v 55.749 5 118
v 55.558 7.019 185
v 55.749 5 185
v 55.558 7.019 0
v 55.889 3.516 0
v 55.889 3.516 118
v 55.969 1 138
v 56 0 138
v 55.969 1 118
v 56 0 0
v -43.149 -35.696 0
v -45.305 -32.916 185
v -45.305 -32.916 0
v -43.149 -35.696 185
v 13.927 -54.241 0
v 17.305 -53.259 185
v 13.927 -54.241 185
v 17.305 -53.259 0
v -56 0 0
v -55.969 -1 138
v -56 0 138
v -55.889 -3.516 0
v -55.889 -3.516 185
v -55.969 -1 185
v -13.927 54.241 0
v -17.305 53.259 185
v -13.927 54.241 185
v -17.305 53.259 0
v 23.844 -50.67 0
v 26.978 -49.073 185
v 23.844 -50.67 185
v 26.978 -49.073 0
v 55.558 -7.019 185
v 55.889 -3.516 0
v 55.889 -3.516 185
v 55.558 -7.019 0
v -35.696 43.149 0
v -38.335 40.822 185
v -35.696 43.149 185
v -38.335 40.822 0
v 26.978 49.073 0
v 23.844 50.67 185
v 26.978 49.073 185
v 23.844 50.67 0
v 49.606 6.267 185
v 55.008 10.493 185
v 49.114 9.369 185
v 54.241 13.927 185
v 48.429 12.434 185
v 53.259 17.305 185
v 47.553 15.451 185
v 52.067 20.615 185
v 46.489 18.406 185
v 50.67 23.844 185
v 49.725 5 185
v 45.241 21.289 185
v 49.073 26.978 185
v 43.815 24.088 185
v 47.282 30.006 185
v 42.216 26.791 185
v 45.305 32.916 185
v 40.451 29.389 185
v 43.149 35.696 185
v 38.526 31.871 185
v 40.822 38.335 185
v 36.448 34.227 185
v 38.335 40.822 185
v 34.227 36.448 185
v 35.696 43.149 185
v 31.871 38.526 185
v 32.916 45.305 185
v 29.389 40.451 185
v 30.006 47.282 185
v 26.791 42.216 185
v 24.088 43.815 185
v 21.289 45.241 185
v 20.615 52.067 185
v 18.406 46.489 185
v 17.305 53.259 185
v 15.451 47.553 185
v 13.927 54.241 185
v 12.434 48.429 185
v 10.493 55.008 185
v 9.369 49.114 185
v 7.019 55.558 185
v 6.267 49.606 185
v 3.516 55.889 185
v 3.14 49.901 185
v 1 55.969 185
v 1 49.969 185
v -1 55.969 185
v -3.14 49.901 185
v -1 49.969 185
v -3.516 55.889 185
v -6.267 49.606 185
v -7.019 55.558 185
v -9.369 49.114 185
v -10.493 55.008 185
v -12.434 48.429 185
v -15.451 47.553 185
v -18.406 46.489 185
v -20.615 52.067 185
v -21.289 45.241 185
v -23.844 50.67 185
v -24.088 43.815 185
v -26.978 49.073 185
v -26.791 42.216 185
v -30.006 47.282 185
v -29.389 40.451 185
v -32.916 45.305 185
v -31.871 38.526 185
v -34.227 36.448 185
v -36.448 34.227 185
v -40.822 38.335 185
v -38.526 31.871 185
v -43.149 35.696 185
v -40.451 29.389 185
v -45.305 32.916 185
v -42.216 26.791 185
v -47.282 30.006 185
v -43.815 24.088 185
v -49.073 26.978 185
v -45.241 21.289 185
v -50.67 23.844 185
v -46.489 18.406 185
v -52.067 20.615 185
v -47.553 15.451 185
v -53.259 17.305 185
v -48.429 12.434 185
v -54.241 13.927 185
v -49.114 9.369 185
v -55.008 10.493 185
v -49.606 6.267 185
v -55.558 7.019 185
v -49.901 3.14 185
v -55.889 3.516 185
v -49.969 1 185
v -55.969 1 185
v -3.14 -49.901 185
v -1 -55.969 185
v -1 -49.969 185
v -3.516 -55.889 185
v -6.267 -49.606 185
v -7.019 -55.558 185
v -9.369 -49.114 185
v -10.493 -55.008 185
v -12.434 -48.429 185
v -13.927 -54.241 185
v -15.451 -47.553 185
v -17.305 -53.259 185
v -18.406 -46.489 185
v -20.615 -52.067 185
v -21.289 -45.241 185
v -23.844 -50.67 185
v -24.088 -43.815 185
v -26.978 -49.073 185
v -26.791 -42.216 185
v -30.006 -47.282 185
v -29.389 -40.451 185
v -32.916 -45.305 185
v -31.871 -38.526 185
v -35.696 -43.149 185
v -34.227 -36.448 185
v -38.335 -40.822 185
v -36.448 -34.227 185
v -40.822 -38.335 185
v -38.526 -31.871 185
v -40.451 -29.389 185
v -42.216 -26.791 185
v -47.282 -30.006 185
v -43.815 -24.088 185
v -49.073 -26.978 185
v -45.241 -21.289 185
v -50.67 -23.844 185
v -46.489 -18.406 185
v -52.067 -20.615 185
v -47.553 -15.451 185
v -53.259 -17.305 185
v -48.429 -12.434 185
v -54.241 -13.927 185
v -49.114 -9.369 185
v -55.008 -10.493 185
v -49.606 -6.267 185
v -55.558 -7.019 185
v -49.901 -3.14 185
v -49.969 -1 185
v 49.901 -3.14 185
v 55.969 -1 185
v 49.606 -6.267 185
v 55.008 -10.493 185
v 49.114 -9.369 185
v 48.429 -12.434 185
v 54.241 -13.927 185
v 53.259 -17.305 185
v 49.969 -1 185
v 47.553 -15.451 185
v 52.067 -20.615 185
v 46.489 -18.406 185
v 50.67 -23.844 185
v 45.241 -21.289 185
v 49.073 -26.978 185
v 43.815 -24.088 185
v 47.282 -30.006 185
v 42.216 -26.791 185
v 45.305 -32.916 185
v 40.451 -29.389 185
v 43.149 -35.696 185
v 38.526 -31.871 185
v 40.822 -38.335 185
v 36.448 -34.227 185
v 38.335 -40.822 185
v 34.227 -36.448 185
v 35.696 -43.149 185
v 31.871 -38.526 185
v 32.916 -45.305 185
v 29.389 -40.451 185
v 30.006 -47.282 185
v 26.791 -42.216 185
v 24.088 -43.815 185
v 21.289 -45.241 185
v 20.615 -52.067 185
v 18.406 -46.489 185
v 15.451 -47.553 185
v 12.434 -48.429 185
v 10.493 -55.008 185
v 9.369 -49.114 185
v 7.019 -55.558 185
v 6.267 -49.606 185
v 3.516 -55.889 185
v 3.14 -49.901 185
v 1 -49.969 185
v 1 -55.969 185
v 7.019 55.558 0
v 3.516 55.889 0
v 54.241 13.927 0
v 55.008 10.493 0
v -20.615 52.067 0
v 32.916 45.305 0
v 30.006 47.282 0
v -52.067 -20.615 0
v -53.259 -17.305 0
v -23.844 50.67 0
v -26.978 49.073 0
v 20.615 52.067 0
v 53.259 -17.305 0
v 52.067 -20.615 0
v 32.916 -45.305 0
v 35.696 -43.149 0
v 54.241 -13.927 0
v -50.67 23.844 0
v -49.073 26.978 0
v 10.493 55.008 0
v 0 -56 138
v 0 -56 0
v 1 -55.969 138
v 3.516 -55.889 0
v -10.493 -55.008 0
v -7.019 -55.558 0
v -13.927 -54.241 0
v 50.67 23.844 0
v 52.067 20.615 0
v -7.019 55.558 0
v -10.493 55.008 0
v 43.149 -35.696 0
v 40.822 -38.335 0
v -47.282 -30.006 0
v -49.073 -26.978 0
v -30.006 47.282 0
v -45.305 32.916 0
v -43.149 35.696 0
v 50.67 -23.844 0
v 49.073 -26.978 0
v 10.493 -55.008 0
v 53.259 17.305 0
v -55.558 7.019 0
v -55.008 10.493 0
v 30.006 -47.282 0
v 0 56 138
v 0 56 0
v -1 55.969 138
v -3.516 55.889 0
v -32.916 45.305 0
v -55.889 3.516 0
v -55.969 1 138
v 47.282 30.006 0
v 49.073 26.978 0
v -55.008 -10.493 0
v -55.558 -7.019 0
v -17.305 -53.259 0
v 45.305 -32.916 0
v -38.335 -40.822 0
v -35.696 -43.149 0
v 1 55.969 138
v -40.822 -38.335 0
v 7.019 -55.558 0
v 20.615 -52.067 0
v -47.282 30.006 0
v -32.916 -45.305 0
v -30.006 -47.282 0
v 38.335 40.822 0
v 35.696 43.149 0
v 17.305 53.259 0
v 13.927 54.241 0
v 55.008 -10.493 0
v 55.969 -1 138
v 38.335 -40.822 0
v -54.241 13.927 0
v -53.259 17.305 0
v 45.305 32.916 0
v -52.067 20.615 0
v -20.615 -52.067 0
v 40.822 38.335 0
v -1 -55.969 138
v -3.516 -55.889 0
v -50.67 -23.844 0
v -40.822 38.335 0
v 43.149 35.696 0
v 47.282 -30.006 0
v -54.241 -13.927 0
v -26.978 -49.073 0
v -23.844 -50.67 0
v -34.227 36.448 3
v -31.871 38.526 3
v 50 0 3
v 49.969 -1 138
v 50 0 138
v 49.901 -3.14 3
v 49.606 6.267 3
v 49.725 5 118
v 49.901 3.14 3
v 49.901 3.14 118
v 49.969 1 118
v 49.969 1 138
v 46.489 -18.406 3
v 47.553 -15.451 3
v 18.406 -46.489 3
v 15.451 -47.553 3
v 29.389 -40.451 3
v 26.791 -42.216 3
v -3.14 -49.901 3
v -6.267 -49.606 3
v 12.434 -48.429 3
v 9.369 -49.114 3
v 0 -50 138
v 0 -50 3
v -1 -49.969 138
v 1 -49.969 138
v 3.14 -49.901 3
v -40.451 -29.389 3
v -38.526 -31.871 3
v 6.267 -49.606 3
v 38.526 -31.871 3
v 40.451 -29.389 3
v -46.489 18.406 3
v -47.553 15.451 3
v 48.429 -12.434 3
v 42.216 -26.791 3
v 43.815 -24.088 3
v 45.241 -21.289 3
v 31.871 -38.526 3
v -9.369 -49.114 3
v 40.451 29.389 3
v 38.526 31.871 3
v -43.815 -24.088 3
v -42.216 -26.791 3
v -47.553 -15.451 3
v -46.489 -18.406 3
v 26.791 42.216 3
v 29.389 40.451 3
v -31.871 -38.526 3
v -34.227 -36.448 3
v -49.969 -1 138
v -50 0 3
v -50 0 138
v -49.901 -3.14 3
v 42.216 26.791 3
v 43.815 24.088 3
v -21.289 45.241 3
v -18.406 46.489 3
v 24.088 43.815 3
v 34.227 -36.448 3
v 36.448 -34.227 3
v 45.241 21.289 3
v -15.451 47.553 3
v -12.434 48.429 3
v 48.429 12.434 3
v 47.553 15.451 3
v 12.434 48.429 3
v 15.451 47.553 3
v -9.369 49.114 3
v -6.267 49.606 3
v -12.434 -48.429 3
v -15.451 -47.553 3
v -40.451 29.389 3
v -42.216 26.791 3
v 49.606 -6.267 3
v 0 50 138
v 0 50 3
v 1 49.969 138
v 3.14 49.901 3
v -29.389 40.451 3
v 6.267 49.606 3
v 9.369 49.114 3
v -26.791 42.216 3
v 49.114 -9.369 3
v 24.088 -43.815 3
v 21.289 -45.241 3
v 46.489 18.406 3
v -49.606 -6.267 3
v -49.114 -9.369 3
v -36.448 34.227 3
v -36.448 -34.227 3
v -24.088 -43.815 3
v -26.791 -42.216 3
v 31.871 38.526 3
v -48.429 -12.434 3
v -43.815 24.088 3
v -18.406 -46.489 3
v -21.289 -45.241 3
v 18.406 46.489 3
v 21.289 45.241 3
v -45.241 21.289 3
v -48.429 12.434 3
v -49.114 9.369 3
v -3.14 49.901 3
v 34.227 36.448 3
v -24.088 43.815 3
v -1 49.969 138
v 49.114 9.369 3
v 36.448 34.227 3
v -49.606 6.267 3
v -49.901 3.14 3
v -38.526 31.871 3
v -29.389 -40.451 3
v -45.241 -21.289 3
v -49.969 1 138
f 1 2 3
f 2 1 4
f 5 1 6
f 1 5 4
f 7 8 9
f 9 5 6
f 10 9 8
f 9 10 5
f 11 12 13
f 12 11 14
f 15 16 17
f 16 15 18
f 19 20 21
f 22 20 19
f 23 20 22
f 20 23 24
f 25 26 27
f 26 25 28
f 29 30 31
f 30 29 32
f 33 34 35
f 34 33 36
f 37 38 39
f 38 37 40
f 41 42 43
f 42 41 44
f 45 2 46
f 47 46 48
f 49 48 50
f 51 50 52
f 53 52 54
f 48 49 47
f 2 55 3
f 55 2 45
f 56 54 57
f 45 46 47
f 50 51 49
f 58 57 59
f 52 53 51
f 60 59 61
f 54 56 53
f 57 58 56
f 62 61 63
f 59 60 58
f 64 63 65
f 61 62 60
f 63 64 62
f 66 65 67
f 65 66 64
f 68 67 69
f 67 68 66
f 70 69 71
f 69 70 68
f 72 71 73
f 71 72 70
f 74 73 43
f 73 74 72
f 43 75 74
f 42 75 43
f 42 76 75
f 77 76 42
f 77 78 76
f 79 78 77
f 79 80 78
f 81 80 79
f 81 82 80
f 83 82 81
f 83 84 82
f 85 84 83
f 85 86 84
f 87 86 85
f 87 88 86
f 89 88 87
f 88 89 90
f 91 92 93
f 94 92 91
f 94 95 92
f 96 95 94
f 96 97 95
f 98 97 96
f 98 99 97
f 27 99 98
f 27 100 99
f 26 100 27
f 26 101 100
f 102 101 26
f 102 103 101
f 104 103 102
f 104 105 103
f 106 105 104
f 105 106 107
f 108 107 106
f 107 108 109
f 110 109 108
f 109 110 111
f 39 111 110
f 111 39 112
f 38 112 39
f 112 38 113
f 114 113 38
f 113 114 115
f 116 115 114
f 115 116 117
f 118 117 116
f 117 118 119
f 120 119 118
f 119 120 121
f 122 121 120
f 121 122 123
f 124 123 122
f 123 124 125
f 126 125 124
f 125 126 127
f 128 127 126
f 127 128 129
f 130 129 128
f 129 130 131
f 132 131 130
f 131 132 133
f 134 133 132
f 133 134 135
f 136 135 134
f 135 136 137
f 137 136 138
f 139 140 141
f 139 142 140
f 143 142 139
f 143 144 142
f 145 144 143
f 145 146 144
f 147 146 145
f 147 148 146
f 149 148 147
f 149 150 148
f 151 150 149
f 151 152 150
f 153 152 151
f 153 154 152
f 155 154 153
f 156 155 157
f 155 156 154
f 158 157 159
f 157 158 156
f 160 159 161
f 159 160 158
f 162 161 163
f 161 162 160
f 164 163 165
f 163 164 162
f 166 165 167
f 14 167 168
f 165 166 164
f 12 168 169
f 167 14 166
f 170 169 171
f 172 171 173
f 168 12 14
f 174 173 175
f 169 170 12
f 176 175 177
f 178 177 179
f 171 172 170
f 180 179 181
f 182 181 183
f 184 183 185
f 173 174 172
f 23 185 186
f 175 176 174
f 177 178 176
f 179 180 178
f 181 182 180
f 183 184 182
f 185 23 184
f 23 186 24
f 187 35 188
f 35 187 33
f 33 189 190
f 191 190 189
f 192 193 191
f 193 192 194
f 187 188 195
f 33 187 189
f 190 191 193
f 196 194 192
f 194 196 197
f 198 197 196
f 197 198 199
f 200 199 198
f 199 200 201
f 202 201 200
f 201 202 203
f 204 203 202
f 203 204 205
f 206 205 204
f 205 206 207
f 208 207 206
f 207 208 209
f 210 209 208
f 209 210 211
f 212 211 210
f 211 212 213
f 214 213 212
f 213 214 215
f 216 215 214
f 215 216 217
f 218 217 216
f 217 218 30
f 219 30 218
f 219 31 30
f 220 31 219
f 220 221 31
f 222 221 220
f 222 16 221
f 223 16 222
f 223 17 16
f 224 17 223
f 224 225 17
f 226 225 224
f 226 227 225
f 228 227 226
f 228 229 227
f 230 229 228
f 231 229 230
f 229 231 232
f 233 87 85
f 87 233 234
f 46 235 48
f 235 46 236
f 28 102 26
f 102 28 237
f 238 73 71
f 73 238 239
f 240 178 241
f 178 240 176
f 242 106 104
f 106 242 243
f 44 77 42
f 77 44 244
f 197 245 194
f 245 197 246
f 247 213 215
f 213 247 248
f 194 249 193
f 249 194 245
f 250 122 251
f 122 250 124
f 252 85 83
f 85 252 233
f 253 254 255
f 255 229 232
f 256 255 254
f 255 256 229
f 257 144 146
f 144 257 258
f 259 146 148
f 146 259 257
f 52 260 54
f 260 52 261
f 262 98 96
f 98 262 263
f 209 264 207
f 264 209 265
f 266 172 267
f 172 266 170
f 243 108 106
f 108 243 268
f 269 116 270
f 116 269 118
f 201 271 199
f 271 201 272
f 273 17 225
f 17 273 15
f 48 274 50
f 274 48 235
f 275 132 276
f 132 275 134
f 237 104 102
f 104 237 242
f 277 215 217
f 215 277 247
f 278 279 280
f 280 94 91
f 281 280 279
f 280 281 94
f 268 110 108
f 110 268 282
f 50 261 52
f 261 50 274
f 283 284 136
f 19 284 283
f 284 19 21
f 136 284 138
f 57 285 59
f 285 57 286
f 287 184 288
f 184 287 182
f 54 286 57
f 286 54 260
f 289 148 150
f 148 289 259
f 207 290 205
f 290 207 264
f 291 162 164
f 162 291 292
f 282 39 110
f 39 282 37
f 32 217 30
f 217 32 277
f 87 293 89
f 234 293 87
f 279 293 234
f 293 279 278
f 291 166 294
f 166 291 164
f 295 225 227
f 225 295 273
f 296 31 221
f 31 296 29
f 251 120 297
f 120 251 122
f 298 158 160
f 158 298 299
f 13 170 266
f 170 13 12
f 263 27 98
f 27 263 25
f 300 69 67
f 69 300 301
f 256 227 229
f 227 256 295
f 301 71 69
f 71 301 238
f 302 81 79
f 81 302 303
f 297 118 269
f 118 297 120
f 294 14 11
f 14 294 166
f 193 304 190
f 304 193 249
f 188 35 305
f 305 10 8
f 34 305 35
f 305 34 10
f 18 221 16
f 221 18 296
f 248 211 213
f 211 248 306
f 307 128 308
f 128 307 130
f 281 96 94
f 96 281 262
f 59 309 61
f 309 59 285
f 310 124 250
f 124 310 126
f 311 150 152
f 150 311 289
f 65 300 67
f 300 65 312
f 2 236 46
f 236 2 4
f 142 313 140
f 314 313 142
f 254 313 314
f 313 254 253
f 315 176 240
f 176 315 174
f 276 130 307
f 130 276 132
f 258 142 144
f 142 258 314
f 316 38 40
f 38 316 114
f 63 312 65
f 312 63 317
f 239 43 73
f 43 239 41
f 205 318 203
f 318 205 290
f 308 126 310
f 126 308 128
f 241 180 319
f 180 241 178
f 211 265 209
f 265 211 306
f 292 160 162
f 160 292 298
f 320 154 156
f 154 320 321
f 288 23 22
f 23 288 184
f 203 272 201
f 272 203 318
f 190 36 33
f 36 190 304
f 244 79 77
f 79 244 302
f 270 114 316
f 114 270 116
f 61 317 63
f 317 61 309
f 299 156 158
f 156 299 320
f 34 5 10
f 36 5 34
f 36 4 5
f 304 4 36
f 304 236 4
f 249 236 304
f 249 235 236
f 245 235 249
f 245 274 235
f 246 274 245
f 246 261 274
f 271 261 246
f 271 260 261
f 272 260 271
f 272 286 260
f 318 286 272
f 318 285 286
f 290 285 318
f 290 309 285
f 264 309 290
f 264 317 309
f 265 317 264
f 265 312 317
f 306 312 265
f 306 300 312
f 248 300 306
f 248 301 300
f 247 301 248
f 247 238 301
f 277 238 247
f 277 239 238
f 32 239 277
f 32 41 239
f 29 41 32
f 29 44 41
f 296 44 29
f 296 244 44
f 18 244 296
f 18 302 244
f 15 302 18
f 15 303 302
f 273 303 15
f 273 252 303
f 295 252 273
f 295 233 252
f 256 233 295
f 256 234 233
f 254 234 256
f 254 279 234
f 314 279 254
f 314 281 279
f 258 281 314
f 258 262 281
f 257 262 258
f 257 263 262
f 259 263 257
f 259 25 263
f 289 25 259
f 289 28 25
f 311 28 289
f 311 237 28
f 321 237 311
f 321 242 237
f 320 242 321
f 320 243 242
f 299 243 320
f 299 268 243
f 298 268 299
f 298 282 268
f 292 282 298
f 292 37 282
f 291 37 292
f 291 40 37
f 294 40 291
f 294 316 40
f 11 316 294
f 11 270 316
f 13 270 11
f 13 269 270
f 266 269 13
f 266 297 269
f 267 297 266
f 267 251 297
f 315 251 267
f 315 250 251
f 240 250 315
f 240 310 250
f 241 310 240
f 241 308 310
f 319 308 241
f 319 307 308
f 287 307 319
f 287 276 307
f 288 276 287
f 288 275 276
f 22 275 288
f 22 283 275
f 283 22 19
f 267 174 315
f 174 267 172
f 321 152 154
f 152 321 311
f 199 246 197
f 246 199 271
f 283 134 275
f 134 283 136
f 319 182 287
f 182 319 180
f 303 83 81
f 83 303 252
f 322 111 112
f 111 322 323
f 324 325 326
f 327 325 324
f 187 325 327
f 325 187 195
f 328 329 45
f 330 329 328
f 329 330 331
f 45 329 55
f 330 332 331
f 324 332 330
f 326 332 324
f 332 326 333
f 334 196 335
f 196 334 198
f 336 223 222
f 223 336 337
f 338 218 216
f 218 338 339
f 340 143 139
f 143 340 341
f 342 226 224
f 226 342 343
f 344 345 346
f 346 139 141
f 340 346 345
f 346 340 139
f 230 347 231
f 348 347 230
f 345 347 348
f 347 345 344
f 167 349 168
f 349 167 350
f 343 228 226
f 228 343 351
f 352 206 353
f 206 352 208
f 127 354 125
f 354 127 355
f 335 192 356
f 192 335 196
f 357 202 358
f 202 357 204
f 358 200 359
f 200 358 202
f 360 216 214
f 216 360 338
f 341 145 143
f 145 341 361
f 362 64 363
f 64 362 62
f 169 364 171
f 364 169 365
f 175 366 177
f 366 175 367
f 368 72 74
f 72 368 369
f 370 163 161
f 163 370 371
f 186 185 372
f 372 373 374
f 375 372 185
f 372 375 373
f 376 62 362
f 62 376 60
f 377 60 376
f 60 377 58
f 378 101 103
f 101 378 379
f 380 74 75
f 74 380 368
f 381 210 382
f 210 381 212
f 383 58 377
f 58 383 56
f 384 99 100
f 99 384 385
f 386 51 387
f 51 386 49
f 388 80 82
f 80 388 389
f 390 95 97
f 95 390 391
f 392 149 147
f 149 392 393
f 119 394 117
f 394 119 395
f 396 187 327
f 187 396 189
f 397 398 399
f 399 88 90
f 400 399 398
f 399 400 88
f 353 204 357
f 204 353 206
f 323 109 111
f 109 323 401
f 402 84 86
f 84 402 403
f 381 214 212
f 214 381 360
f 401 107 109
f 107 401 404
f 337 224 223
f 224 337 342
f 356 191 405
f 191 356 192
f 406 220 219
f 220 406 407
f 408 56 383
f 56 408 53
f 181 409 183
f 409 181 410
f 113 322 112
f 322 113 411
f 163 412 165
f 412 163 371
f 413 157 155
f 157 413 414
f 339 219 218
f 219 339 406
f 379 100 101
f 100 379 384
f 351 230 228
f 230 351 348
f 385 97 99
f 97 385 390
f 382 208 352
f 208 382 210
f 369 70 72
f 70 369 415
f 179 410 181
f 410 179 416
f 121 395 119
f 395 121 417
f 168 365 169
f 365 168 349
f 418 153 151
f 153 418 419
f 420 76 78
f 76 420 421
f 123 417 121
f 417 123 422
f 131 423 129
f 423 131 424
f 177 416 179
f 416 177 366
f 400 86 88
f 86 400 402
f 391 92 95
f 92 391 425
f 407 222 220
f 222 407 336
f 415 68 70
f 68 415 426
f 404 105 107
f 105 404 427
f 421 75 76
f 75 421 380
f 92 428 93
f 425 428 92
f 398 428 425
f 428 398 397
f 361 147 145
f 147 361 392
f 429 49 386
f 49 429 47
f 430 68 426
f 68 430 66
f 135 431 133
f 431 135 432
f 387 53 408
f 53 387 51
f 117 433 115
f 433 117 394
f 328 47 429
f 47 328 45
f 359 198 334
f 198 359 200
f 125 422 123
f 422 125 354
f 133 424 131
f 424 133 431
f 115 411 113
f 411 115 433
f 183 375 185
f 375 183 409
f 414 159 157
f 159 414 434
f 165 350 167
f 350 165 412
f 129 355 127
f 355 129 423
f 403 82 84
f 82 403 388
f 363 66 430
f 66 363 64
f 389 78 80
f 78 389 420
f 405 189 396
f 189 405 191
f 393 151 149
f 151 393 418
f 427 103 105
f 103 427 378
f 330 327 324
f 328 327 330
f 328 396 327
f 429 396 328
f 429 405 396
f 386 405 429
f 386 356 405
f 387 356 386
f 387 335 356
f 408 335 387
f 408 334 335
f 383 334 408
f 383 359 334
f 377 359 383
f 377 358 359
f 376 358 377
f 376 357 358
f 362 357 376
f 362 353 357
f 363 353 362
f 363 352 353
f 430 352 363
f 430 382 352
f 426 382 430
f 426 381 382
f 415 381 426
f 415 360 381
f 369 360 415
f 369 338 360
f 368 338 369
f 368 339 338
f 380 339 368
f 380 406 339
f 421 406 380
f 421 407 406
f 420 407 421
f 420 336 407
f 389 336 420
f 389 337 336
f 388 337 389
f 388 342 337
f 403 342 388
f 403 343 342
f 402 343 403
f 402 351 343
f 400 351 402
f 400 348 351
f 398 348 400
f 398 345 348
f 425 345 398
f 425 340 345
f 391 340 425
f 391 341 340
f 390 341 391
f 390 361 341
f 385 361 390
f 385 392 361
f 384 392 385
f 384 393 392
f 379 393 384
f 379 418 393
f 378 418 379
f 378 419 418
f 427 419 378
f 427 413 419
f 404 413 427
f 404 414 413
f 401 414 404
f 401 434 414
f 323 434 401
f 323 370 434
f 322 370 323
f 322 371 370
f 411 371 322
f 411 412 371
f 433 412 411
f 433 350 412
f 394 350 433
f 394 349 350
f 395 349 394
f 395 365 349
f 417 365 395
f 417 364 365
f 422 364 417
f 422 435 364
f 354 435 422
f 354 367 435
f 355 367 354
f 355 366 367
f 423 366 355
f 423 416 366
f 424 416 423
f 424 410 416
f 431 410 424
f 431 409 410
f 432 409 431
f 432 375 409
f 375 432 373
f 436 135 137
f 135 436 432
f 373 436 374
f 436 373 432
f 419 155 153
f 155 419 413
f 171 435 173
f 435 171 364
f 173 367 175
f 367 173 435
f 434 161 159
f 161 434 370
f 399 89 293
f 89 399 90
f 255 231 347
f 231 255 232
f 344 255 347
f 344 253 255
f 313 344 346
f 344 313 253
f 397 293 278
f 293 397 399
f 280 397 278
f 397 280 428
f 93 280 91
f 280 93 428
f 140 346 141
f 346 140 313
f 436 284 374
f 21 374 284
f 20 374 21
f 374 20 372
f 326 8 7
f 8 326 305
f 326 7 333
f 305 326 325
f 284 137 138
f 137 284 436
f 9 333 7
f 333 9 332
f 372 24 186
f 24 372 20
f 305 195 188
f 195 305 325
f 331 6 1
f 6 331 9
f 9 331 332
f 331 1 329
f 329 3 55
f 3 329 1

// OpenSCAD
$fn = 100;

in_d = 100;
wall = 6;

thread_height = 173;
thread_length = 20;
spider_height = 135;

difference(){
    cylinder(d = in_d+2*wall, h=185);
    translate([0, 0, 3])
        cylinder(d = in_d, h= 185);
    
    translate([0, 0, 3+30+spider_height])
        cube([2, 150, 60], center = true);
    translate([0, 0, 3+30+spider_height])
        cube([150, 2, 60], center = true);
    translate([50, 3, 3+spider_height+20])
        cube([150, 4, 80], center = true);
    
}
